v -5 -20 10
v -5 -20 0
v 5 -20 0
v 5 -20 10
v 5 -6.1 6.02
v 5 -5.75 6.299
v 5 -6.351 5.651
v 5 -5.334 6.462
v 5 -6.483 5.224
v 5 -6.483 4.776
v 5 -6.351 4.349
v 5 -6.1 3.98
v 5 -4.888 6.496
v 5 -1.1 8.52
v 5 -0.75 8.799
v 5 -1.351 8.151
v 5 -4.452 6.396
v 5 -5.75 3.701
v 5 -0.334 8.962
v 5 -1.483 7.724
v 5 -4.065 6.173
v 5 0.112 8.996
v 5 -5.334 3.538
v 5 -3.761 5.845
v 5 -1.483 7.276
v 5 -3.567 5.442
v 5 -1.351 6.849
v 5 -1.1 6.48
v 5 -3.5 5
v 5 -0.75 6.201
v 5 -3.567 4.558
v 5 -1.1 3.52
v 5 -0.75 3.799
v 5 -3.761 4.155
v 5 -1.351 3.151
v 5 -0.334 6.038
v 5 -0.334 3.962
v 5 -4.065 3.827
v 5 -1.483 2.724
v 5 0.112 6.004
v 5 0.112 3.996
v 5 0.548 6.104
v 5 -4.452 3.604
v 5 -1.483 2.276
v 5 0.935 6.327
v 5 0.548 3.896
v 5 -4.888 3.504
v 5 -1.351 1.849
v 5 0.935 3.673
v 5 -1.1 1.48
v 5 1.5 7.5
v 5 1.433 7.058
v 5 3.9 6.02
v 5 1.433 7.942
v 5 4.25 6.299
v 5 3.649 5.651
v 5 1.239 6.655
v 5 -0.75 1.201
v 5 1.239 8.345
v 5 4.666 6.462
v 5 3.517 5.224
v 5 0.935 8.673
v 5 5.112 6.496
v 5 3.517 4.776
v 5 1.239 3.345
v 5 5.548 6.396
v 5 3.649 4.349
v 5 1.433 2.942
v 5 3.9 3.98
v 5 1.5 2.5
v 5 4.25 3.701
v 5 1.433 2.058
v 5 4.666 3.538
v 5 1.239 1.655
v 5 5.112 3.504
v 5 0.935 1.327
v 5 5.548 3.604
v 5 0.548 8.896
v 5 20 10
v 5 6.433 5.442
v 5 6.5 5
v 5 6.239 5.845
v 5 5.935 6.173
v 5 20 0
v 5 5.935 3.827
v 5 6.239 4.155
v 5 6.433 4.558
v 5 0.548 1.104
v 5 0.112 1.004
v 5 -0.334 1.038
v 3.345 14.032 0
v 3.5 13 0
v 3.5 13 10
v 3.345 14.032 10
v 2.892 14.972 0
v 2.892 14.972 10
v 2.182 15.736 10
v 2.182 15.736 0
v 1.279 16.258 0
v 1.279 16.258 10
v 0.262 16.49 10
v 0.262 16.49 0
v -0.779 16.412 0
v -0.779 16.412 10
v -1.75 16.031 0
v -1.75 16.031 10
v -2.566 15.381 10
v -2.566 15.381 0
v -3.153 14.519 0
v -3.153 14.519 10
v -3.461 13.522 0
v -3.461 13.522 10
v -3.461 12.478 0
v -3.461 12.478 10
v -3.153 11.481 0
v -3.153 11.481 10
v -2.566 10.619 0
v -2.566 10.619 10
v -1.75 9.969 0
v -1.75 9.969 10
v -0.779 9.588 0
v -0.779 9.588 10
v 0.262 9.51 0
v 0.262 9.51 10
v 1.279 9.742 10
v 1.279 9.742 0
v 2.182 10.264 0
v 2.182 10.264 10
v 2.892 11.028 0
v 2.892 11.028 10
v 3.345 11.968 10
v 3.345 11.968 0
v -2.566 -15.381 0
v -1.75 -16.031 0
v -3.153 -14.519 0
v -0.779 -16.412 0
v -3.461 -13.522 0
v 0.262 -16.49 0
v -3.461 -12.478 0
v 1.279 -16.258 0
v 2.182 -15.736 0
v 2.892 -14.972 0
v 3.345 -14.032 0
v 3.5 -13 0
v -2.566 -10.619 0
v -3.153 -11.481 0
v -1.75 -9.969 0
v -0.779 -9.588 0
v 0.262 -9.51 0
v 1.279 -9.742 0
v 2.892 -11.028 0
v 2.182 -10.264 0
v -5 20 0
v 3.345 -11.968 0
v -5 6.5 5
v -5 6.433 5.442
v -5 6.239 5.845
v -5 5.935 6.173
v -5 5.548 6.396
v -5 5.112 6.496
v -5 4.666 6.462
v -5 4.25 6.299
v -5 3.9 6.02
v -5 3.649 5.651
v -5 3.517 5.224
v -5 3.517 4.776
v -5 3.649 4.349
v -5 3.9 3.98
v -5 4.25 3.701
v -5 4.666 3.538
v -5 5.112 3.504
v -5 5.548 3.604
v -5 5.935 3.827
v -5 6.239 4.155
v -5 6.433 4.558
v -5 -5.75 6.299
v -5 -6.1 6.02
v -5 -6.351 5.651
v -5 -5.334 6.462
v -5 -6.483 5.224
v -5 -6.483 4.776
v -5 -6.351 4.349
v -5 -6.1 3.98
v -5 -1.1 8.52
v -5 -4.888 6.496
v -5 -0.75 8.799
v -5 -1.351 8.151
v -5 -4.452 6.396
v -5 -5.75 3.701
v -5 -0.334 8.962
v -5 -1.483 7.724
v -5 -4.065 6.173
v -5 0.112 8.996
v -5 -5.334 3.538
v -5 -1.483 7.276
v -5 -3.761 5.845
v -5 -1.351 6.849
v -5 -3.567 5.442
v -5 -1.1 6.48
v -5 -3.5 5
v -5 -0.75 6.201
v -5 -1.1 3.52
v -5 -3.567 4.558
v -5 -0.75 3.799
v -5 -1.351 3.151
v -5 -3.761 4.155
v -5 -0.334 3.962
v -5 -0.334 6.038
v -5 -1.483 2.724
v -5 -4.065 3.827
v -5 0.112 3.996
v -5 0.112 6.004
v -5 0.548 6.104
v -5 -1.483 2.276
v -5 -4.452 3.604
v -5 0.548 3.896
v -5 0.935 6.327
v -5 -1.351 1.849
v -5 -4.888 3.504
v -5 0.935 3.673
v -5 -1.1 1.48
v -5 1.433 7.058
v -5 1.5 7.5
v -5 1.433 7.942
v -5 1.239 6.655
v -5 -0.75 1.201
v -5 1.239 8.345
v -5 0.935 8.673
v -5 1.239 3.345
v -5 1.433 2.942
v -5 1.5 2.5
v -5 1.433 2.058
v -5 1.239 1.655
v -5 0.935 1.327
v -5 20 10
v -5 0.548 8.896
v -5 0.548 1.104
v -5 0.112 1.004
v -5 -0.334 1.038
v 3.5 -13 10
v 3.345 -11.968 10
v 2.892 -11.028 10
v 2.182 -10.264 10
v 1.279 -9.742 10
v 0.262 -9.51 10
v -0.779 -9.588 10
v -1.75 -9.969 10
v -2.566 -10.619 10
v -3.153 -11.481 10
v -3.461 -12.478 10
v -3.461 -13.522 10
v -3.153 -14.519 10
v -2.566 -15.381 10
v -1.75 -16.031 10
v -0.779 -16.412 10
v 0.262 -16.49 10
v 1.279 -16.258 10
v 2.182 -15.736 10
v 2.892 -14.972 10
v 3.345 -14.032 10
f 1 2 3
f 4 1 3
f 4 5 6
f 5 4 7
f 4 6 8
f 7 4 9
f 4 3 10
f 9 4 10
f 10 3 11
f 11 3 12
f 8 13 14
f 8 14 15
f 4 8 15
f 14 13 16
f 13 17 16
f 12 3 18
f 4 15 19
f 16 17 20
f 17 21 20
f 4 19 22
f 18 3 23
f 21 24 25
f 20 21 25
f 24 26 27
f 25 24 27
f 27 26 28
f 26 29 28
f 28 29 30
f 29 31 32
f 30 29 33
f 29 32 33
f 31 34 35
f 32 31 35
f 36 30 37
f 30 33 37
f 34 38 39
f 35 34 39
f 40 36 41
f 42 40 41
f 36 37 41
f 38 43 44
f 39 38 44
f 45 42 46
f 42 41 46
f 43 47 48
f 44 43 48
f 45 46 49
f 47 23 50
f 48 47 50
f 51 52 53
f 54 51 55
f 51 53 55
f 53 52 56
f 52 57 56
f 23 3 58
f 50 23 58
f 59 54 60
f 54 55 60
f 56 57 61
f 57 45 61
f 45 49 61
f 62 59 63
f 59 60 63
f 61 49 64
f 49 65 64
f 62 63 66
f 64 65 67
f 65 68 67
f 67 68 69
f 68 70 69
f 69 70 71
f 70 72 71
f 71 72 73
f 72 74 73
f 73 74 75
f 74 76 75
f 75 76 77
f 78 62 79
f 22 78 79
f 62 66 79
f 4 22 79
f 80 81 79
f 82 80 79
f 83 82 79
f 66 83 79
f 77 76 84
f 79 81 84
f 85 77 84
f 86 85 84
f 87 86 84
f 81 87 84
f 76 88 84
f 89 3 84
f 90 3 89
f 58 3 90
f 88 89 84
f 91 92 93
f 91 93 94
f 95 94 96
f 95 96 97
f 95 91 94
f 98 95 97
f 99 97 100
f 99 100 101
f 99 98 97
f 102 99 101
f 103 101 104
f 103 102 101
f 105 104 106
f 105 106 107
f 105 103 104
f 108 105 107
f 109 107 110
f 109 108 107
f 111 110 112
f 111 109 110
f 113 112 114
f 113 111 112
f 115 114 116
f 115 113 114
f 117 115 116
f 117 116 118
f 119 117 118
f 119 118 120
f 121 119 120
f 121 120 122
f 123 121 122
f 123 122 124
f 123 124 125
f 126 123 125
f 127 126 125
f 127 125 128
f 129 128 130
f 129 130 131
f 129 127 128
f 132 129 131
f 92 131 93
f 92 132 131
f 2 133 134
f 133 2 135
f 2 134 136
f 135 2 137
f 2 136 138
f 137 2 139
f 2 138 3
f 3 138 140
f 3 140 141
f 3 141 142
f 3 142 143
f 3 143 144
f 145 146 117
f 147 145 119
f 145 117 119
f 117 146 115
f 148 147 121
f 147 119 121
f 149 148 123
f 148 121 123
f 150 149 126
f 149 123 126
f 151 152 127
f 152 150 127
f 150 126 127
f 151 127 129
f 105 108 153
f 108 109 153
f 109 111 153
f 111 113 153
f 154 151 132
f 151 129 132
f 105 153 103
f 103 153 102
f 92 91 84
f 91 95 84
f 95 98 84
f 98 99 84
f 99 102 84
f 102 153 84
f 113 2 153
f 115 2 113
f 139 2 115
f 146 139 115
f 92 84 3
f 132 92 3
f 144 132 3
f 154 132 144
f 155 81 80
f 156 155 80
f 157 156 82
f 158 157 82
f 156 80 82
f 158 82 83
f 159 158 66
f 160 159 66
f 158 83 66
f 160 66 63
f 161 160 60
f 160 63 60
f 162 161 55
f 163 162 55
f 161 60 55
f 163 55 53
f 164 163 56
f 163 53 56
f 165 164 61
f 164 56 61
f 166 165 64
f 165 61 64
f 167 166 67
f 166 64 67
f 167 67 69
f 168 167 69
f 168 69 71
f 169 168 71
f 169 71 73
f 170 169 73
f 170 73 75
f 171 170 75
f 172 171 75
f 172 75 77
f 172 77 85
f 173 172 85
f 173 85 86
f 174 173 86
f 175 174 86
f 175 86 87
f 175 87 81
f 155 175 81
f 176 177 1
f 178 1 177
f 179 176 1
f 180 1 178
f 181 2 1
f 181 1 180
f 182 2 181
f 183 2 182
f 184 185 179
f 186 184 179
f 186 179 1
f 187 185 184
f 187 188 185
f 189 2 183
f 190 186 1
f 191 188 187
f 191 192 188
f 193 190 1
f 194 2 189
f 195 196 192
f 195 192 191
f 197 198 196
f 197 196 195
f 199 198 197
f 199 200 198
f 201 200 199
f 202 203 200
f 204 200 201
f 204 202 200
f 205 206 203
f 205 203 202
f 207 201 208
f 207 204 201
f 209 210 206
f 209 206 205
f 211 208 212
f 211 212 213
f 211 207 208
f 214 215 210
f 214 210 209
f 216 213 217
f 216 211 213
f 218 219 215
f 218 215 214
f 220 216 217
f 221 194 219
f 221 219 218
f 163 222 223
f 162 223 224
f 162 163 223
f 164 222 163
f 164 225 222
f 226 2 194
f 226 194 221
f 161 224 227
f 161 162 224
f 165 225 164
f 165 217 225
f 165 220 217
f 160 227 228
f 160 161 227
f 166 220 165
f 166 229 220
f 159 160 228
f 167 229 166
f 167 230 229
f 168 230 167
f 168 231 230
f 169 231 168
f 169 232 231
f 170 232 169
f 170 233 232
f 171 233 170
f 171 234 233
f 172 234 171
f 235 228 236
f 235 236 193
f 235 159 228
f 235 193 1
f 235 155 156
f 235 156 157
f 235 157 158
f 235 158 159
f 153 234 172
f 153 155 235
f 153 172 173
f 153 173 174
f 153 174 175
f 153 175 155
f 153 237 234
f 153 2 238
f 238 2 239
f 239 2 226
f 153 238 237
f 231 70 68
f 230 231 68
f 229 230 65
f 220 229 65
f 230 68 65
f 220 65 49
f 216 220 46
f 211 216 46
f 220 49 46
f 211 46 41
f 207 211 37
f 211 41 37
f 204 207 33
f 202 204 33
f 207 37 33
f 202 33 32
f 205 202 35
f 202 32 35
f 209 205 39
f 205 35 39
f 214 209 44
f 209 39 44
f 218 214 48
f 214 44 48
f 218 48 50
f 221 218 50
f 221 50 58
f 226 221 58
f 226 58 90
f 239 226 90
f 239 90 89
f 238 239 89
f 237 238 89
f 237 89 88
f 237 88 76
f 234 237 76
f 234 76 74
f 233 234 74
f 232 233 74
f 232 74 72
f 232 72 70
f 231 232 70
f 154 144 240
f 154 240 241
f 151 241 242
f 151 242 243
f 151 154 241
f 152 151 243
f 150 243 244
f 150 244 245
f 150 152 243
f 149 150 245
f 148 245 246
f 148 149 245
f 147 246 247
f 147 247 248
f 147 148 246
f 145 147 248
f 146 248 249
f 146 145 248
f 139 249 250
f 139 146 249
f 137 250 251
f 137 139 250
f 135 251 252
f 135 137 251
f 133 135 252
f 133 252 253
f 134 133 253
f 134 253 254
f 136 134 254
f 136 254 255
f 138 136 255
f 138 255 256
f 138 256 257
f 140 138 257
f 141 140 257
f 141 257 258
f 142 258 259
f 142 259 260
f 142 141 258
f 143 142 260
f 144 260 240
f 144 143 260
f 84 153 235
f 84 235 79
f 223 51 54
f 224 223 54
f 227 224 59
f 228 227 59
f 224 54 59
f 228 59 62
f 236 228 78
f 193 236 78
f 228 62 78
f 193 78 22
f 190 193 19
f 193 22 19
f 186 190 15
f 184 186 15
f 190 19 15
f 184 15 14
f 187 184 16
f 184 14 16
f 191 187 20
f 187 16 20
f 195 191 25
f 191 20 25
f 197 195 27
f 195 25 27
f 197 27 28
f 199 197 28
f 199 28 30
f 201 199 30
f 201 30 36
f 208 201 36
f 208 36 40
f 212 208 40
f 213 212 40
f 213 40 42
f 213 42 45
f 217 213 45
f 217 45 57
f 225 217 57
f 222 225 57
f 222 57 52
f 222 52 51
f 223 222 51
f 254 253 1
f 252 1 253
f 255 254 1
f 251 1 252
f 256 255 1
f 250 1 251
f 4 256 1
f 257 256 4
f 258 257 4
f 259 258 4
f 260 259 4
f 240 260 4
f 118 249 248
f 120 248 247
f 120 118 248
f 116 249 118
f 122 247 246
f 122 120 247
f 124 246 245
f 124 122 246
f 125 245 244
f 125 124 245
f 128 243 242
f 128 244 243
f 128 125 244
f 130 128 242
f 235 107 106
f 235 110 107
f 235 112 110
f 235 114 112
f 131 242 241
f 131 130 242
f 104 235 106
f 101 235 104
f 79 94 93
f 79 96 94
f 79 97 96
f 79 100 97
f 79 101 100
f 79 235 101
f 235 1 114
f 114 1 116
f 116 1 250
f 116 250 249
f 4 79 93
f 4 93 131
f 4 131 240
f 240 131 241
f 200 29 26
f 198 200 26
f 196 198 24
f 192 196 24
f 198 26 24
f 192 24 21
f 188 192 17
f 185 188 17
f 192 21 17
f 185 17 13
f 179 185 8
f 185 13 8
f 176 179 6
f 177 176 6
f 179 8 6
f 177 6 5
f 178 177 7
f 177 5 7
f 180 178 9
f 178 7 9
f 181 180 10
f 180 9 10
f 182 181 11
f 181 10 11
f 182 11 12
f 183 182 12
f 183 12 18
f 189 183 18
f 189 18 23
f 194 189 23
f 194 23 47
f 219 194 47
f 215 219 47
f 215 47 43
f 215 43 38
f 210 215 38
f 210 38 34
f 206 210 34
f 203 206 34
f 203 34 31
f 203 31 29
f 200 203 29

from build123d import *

# Parameters (mm, degrees)
SKETCH_1_W          = 10
SKETCH_1_H          = 40
SKETCH_1_R          = 3.5
EXTRUDE_1_DEPTH     = 10
SKETCH_2_R          = 1.5
CUT_EXTRUDE_1_DEPTH = 25.494897428


with BuildPart() as part:
    # 草图1 → 凸台-拉伸1 (new body)
    with BuildSketch(Plane.XY):
        Rectangle(SKETCH_1_W, SKETCH_1_H)
        with Locations((0, 13)):
            Circle(SKETCH_1_R, mode=Mode.SUBTRACT)
        with Locations((0, -13)):
            Circle(SKETCH_1_R, mode=Mode.SUBTRACT)
    extrude(amount=EXTRUDE_1_DEPTH)

    # 草图2 → 切除-拉伸1 (cut, through all)
    with BuildSketch(Plane(origin=(5, 0, 0), x_dir=(0, 0, -1), z_dir=(1, 0, 0))):
        with Locations(Location((-5, 5, 0), (0, 0, 90))):
            Circle(SKETCH_2_R)
        with Locations(Location((-5, -5, 0), (0, 0, 90))):
            Circle(SKETCH_2_R)
        with Locations(Location((-2.5, 0, 0), (0, 0, 90))):
            Circle(SKETCH_2_R)
        with Locations(Location((-7.5, 0, 0), (0, 0, 90))):
            Circle(SKETCH_2_R)
    extrude(amount=-CUT_EXTRUDE_1_DEPTH, mode=Mode.SUBTRACT)


solid = part.part
